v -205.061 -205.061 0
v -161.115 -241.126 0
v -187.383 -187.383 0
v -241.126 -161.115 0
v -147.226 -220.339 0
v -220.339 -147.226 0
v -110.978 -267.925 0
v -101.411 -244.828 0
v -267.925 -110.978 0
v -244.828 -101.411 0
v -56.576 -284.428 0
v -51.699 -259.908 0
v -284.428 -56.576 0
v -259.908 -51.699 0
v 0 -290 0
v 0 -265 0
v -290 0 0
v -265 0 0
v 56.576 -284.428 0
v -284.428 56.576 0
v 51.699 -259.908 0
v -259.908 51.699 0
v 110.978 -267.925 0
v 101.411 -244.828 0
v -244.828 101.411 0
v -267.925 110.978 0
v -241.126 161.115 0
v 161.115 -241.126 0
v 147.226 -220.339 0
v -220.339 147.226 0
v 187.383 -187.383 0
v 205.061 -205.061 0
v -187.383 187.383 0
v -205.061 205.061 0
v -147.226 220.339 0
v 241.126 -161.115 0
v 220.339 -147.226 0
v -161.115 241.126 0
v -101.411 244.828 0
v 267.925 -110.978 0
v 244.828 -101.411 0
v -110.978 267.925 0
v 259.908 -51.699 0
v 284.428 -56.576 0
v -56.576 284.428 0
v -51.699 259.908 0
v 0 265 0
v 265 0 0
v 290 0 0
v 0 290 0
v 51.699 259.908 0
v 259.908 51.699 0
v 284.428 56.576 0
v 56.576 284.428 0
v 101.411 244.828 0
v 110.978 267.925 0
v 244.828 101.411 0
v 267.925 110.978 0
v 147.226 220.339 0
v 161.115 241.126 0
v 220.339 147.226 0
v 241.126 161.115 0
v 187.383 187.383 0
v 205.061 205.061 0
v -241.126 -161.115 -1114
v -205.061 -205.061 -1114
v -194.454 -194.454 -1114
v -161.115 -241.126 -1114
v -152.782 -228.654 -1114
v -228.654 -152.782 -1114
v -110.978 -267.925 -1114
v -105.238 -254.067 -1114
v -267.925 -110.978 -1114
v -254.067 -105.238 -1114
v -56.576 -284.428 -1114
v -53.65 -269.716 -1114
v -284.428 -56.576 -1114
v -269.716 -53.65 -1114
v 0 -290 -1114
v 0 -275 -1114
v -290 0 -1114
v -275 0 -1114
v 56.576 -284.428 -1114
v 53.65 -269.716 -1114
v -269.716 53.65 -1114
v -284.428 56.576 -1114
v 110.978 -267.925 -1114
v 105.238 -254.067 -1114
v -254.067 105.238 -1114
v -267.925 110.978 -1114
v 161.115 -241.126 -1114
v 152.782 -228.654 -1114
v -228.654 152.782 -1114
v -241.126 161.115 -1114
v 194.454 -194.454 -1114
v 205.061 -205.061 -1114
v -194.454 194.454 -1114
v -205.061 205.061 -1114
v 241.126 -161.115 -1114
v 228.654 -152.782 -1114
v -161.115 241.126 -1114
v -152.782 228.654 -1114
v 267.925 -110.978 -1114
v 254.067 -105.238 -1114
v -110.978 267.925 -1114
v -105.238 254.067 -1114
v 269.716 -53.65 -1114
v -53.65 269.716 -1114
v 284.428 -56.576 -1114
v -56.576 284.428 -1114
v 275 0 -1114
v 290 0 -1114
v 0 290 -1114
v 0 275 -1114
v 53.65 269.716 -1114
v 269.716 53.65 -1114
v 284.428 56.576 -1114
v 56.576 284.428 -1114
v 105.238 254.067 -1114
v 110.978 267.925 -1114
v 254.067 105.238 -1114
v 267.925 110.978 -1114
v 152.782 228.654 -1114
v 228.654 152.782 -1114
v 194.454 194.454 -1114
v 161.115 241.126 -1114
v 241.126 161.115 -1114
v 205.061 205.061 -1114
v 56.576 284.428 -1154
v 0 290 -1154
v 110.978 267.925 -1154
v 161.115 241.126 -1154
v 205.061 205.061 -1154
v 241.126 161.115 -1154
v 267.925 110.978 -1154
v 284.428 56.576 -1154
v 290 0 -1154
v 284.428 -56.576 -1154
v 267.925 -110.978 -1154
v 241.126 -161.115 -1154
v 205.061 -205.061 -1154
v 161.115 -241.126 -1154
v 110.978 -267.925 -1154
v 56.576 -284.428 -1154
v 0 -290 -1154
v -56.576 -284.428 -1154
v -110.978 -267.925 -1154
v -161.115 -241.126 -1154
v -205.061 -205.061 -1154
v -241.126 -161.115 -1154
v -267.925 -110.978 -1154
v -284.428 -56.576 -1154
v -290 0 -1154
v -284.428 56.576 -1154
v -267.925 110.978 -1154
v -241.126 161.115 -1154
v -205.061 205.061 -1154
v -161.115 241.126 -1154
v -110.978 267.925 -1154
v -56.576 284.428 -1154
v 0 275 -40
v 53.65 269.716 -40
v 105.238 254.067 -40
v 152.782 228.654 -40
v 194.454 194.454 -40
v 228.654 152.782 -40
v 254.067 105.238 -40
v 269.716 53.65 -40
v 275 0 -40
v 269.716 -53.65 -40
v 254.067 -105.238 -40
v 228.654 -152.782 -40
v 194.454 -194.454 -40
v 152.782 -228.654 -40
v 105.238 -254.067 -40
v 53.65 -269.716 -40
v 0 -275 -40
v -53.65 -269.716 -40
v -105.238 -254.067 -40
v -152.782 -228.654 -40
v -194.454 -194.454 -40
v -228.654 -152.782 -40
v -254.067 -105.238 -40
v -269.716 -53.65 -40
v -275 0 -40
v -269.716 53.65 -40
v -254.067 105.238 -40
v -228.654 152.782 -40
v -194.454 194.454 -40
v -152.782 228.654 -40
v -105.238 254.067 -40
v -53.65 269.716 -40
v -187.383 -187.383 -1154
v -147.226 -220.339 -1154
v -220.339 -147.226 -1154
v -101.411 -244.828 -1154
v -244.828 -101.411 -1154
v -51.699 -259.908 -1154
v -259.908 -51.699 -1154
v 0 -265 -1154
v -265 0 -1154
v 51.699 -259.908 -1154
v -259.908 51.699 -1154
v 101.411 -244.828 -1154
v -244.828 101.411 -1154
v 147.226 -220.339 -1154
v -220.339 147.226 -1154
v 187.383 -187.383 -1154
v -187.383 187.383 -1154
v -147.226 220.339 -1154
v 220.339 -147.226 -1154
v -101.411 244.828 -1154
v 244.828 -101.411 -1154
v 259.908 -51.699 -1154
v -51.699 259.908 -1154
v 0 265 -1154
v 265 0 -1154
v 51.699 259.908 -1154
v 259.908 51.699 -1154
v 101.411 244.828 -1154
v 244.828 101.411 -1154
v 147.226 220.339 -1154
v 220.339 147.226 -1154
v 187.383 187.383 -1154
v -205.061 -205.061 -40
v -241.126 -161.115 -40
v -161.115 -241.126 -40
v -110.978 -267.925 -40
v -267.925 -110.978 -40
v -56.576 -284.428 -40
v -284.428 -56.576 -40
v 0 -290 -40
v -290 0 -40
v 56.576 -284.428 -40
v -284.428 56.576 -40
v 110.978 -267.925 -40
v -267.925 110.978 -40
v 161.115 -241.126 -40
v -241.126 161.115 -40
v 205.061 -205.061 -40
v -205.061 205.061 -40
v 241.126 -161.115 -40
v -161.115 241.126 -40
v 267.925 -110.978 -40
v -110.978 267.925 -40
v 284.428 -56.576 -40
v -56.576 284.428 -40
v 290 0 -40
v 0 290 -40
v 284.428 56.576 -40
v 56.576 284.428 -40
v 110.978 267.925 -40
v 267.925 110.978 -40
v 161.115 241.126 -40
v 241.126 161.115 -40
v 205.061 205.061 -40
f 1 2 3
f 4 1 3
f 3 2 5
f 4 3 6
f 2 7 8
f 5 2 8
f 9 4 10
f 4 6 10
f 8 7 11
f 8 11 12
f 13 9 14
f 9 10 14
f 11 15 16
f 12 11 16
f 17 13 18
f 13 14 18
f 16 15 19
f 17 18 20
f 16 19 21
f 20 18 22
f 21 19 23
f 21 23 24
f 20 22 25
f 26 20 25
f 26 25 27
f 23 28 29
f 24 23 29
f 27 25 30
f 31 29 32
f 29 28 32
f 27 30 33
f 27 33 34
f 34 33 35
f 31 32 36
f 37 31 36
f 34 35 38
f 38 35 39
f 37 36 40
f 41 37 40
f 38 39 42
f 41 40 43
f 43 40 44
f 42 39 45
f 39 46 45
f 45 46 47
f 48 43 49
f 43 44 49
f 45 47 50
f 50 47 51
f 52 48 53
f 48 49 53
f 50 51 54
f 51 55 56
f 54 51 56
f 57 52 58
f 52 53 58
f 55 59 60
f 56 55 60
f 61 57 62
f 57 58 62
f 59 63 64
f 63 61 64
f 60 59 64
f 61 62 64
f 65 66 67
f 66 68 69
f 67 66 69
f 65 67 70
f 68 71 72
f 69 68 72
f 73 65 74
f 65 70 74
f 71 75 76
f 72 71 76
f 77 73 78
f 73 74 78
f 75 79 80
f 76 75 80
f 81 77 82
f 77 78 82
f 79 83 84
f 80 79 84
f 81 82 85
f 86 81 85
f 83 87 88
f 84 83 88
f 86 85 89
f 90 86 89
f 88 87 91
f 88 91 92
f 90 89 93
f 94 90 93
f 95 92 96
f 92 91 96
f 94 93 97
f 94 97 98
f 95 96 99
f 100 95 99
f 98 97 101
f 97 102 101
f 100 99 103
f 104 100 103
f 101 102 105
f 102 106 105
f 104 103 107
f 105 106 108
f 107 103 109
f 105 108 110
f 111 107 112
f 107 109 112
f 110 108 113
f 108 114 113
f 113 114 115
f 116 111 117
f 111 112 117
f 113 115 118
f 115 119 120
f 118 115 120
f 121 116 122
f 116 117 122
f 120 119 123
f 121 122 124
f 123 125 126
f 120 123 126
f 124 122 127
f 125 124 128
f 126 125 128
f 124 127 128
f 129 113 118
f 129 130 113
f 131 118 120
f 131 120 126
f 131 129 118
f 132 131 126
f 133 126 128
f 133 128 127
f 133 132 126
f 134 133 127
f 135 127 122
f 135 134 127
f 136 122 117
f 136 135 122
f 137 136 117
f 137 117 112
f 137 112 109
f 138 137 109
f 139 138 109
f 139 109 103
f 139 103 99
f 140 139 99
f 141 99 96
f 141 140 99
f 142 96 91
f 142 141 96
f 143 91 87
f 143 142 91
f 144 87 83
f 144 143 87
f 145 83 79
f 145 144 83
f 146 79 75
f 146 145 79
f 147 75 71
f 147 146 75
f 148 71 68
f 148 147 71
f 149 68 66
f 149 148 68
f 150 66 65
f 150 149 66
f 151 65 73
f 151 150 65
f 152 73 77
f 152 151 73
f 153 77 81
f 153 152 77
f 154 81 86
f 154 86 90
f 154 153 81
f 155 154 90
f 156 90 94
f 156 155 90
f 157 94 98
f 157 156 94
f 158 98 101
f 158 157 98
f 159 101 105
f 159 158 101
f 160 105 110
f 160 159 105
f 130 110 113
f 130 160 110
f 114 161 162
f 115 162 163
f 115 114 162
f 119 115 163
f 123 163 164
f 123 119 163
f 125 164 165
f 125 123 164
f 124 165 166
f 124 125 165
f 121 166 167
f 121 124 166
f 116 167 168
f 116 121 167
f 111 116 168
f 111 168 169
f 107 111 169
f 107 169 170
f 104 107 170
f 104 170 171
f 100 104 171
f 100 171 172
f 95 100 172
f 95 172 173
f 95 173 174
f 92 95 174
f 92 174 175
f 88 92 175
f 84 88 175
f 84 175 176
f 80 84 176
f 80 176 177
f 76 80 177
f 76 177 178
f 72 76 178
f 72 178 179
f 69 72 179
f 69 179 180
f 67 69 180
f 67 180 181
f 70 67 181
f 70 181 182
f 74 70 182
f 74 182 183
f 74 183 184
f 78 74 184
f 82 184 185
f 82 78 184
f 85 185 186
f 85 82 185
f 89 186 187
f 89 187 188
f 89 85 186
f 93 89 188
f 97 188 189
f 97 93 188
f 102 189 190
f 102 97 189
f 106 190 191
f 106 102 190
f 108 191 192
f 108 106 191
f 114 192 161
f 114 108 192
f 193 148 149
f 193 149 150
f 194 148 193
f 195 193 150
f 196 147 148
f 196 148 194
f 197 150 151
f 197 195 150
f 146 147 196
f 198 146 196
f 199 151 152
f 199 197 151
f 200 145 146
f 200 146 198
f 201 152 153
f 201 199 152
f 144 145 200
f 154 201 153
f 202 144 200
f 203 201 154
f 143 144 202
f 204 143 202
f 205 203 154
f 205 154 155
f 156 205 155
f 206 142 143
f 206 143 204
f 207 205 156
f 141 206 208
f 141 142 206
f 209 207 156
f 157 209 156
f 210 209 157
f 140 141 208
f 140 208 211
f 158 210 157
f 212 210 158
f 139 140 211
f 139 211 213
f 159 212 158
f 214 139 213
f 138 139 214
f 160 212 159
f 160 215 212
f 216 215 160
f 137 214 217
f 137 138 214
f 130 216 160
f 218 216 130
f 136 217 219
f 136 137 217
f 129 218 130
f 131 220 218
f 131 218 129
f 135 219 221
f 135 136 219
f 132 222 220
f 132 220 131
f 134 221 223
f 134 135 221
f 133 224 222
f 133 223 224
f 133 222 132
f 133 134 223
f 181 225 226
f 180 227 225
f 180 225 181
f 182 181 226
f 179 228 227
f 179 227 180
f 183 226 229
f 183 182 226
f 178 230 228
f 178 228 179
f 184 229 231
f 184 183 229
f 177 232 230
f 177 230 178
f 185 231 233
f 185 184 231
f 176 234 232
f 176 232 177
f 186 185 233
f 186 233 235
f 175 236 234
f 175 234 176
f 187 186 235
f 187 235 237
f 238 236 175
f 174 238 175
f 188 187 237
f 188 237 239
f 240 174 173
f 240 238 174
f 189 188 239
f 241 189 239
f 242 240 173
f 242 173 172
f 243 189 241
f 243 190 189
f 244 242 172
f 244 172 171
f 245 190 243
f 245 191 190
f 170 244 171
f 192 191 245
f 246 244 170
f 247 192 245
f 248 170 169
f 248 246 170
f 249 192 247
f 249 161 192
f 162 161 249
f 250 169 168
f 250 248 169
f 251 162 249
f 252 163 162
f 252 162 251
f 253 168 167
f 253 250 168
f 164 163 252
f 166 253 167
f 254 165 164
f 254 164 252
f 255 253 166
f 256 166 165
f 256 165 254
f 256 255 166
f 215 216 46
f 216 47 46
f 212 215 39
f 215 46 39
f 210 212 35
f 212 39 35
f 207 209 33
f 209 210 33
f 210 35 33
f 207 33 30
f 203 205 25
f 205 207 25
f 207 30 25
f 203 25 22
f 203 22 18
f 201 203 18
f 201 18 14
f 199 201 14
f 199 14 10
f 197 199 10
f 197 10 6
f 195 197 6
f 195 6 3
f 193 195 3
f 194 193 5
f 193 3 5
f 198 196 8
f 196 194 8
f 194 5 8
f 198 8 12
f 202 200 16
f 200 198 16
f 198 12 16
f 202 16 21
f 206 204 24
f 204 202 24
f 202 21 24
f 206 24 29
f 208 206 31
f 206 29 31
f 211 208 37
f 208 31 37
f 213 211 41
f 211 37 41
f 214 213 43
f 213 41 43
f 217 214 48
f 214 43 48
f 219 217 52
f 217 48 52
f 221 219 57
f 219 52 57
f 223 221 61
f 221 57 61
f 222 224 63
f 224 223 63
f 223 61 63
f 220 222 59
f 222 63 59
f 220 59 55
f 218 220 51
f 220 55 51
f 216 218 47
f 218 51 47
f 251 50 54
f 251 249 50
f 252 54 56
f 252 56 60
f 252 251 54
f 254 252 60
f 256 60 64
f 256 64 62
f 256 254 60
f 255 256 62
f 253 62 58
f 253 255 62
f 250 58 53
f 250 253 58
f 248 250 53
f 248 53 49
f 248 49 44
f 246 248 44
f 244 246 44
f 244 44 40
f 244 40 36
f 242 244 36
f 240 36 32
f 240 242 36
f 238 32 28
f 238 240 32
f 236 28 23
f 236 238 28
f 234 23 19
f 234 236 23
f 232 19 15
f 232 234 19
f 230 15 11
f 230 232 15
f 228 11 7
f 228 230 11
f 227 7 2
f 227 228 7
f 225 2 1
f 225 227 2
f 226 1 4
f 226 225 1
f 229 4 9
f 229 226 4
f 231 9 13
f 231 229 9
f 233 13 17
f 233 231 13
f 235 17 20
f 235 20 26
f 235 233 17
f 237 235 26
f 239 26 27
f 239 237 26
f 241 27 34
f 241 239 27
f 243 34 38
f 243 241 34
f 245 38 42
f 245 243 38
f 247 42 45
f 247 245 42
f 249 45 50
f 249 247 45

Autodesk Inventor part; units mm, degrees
ref_plane "YZ Plane" through (0, 0, 0) normal (1, 0, 0) x (0, 1, 0)
ref_plane "XZ Plane" through (0, 0, 0) normal (0, 1, 0) x (-1, 0, 0)
ref_plane "XY Plane" through (0, 0, 0) normal (0, 0, 1) x (1, 0, 0)
sketch "Sketch1" plane through (0, 0, 0) normal (1, 0, 0) x (0, 1, 0)
  line L0 (0, 0) -> (0, -1154)
  line L1 (0, -1154) -> (265, -1154)
  line L2 (265, -1154) -> (265, 0)
  line L3 (265, 0) -> (0, 0)
  line L4 (265, 0) -> (290, 0)
  line L5 (290, 0) -> (290, -40)
  line L6 (290, -40) -> (275, -40)
  line L7 (275, -40) -> (275, -1114)
  line L8 (275, -1114) -> (290, -1114)
  line L9 (290, -1114) -> (290, -1154)
  line L10 (265, -1154) -> (290, -1154)
  dimension "d16" = 530
  dimension "d17" = 550
  dimension "d18" = 580
  dimension "d19" = 40
  dimension "d20" = 40
  dimension "d21" = 1154
revolve "Revolution1" add sketch "Sketch1" angle 360 about axis through (0, 0, 0) along (0, 0, -1) contours L4 L5 L6 L7 L8 L9 L10 L2
properties part number "DiscoCorpoTurbina3" material "Steel, Alloy"
